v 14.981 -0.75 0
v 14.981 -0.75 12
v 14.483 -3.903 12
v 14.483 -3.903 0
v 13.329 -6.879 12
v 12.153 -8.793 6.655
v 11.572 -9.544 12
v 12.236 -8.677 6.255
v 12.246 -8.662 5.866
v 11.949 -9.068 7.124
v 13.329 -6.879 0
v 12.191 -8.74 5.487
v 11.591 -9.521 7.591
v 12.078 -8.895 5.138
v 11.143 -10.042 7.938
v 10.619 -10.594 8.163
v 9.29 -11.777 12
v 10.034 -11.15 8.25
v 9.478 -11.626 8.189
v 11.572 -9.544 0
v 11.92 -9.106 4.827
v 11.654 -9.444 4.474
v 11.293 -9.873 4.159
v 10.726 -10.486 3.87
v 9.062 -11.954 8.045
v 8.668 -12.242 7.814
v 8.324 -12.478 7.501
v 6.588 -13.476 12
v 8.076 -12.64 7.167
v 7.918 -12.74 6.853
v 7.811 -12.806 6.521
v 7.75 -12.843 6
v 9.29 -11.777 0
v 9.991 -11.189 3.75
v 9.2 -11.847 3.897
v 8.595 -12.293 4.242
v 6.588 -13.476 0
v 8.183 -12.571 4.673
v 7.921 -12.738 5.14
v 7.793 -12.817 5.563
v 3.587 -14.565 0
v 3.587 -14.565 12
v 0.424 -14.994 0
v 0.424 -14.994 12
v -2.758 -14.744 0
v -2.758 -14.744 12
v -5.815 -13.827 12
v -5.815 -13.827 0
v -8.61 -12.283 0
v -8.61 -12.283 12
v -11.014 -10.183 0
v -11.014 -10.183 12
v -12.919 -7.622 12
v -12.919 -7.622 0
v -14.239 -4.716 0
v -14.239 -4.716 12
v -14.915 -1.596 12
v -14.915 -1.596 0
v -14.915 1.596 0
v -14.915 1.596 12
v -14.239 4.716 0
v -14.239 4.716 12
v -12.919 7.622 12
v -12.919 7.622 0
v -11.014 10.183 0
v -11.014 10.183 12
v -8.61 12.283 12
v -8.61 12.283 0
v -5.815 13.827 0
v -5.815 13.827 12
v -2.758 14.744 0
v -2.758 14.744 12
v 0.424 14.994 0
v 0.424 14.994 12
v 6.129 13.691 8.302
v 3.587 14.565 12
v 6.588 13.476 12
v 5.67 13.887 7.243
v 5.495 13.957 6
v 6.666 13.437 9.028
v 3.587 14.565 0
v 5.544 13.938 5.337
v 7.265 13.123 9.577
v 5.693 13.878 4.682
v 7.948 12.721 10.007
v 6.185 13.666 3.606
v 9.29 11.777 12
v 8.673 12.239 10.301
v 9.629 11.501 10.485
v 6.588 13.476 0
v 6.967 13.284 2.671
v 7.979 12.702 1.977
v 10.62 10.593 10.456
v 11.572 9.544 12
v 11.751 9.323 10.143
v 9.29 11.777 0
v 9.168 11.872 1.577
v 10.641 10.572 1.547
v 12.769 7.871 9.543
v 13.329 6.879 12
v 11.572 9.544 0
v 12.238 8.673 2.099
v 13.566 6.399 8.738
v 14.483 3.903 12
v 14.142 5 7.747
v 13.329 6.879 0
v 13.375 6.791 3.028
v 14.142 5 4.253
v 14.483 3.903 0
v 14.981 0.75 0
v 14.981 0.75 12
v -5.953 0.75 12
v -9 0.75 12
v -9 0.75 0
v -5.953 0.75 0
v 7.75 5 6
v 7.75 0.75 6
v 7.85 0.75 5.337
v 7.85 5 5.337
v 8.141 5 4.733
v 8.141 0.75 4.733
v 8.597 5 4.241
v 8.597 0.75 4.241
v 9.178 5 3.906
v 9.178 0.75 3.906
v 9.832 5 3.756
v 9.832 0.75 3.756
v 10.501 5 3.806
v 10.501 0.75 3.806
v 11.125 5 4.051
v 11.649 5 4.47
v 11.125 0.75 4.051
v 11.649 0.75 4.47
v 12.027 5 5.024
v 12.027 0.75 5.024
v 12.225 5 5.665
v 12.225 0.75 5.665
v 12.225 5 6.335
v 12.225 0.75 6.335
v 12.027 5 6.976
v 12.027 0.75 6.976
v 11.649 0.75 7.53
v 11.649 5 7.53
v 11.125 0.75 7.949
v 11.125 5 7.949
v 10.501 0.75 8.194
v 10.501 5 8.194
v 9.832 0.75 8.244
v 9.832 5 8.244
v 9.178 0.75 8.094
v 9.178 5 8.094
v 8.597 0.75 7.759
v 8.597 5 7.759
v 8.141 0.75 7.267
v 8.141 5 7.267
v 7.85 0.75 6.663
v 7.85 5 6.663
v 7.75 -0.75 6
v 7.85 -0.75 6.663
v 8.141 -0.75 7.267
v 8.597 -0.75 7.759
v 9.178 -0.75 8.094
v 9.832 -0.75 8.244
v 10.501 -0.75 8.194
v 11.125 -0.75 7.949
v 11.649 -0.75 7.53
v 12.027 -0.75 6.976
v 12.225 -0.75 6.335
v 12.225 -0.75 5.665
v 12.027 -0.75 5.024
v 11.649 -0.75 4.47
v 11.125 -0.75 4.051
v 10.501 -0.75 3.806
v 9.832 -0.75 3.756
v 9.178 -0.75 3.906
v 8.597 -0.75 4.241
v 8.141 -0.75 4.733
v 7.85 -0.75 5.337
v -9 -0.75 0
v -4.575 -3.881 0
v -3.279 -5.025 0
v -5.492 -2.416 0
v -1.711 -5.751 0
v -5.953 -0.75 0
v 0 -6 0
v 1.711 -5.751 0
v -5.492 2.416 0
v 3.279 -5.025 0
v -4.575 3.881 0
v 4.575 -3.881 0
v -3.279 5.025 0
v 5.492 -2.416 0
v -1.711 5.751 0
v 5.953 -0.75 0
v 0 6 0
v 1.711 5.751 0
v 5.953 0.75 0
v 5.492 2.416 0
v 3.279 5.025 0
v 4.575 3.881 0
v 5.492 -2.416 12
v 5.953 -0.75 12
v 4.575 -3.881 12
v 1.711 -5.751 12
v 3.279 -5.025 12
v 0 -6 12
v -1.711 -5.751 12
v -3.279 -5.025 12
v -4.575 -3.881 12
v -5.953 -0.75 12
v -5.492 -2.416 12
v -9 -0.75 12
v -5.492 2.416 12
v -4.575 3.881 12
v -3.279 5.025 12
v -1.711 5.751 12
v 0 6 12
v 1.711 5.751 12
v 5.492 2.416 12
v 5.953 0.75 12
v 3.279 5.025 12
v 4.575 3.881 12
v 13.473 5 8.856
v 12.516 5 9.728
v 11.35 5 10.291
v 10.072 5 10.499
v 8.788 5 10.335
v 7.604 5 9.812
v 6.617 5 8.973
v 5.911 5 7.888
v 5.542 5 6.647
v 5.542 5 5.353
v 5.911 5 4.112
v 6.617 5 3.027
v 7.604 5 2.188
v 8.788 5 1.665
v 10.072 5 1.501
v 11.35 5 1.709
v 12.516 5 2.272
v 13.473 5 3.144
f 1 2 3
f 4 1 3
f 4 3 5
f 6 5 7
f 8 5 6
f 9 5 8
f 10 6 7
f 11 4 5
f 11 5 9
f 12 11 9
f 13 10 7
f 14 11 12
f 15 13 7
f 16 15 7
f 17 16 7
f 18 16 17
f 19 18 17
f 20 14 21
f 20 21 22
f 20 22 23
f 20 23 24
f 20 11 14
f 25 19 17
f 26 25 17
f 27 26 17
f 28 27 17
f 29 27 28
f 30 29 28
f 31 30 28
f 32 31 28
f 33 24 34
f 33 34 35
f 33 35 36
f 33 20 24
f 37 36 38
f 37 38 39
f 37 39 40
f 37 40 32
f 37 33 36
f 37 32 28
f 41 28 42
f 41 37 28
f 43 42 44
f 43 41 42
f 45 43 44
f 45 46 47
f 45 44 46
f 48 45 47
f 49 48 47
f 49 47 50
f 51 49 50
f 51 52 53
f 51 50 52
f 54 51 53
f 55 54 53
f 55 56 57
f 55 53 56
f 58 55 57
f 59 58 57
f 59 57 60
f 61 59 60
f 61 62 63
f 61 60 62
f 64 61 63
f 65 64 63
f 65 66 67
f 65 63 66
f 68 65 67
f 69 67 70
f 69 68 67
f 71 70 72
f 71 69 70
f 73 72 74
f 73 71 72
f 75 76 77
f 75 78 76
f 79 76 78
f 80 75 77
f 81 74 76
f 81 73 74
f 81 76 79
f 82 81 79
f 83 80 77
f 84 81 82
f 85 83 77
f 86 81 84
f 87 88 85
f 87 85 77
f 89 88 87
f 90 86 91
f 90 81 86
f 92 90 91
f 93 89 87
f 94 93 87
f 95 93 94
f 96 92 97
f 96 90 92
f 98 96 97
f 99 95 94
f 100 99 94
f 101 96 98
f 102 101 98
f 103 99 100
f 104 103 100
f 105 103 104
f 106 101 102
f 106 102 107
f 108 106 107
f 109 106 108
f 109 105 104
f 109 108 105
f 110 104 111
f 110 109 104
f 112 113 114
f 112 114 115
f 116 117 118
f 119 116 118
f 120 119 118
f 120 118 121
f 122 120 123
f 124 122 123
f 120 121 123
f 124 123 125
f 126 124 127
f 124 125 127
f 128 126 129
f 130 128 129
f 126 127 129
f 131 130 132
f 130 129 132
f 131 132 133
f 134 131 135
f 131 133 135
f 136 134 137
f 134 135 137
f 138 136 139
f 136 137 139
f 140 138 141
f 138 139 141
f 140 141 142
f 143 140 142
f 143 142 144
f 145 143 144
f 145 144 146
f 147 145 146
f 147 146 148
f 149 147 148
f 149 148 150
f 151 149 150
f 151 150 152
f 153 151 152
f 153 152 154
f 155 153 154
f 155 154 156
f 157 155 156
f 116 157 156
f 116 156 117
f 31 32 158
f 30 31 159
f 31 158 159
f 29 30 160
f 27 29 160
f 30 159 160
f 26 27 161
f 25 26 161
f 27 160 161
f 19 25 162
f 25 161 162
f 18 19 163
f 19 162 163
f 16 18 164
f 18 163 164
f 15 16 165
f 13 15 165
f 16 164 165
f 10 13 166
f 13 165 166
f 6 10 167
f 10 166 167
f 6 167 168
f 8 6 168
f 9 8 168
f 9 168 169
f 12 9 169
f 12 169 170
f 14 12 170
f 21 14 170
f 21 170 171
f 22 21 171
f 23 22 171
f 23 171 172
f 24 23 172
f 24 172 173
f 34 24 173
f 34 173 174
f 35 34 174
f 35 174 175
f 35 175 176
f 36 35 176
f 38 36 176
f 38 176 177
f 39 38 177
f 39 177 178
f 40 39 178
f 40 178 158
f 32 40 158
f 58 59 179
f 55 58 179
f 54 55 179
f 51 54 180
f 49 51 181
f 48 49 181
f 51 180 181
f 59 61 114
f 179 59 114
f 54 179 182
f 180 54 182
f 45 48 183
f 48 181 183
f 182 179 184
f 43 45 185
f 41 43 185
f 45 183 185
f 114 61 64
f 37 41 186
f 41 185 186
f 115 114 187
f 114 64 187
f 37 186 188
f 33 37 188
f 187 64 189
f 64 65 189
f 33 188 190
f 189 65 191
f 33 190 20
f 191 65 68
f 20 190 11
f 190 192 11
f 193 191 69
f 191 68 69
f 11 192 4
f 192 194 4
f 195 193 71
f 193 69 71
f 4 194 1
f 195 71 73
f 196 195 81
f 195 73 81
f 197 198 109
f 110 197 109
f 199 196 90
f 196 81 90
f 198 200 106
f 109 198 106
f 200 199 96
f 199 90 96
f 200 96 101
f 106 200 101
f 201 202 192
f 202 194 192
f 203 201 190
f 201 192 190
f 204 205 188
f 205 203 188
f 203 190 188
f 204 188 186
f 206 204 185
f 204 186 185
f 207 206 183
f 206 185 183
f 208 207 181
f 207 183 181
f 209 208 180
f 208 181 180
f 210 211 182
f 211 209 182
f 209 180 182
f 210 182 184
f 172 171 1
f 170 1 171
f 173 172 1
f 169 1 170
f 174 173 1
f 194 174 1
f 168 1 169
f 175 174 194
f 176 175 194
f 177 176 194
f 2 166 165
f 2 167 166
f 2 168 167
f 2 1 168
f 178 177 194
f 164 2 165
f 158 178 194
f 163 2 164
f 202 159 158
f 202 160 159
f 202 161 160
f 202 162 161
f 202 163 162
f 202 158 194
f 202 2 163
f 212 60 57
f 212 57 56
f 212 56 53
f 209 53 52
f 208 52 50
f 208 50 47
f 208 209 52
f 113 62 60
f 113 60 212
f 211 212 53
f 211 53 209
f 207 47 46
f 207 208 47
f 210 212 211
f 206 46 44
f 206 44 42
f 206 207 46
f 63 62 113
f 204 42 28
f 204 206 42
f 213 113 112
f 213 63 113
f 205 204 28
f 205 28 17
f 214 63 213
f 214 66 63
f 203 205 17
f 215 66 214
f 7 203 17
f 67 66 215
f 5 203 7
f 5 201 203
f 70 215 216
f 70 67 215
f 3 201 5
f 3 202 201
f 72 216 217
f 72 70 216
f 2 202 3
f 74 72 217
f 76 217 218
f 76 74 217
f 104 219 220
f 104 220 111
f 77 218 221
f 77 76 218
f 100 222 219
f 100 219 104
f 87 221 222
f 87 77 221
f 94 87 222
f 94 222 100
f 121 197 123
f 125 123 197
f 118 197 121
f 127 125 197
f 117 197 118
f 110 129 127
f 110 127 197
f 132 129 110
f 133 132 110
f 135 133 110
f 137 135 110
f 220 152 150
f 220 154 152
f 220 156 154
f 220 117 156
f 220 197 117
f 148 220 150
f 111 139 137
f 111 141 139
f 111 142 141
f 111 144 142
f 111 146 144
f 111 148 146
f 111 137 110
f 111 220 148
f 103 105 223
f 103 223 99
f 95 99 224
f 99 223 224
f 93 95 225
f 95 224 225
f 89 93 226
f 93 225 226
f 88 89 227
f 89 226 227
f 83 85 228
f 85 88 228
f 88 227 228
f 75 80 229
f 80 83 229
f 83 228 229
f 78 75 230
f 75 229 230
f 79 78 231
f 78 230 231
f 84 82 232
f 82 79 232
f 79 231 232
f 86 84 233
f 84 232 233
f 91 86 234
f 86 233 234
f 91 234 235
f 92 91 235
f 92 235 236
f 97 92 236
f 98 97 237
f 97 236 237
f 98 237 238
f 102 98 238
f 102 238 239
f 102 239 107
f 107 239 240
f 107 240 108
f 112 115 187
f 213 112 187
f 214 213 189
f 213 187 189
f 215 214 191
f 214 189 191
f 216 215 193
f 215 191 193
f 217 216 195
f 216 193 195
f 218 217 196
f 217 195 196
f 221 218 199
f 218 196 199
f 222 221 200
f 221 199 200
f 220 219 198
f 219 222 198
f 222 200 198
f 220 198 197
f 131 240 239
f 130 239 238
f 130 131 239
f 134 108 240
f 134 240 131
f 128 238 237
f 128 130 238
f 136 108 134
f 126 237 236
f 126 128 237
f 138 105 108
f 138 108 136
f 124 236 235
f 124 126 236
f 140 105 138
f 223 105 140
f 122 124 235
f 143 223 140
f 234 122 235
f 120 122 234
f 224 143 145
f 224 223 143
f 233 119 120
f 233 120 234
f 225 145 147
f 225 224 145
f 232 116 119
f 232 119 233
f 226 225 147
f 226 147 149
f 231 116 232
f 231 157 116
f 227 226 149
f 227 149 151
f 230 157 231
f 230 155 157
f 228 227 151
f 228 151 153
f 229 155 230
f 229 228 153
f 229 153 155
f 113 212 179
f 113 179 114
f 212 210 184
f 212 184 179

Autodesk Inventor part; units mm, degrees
ref_plane "YZ Plane" through (0, 0, 0) normal (1, 0, 0) x (0, 1, 0)
ref_plane "XY Plane" through (0, 0, 0) normal (0, 0, 1) x (1, 0, 0)
sketch "スケッチ1" plane through (0, 0, 0) normal (0, 0, 1) x (1, 0, 0)
  circle A0 centre (0, 0) radius 15
  circle A1 centre (0, 0) radius 6
  dimension "d0" = 30
  dimension "d1" = 12
extrude "押し出し1" add sketch "スケッチ1" along normal blind 12
sketch "スケッチ2" plane through (0, 0, 0) normal (0, 1, 0) x (-1, 0, 0)
  line L0 (0, 0) -> (0, 12) construction
  line L1 (0, 6) -> (-10, 6) construction
  circle A0 centre (-10, 6) radius 2.25
  line L2 (15, 12) -> (-15, 12) construction
  line L3 (-15, 0) -> (15, 0) construction
  dimension "d4" = 4.5
  dimension "d5" = 10
  dimension "d6" = 6
extrude "押し出し2" cut sketch "スケッチ2" along normal through all both and the other way through all
sketch "スケッチ3" plane through (0, 0, 12) normal (0, 0, 1) x (1, 0, 0)
  line L0 (0, 0) -> (-15.0903, 0) construction
  line L1 (-9, 0.75) -> (21, 0.75)
  line L2 (21, 0.75) -> (21, -0.75)
  line L3 (21, -0.75) -> (-9, -0.75)
  line L4 (-9, -0.75) -> (-9, 0.75)
  line L5 (-9, 0.75) -> (21, -0.75) construction
  line L6 (21, 0.75) -> (-9, -0.75) construction
  point P0 (6, 0)
  dimension "d9" = 9
  dimension "d10" = 1.5
  dimension "d11" = 30
extrude "押し出し3" cut sketch "スケッチ3" against normal through all
ref_plane "作業平面1" through (0, 5, 0) normal (0, 1, 0) x (-1, 0, 0)
sketch "スケッチ4" plane through (0, 5, 0) normal (0, 1, 0) x (-1, 0, 0)
  circle A0 centre (-9.9953, 6) radius 4.5
  line L0 (0, 0) -> (0.0094, 12) construction
  line L1 (15, 12) -> (-14.9812, 12) construction
  line L2 (0.0047, 6) -> (-9.9953, 6) construction
  dimension "d15" = 9
  dimension "d16" = 10
extrude "押し出し4" cut sketch "スケッチ4" along normal through all
properties part number "セットカラー"
